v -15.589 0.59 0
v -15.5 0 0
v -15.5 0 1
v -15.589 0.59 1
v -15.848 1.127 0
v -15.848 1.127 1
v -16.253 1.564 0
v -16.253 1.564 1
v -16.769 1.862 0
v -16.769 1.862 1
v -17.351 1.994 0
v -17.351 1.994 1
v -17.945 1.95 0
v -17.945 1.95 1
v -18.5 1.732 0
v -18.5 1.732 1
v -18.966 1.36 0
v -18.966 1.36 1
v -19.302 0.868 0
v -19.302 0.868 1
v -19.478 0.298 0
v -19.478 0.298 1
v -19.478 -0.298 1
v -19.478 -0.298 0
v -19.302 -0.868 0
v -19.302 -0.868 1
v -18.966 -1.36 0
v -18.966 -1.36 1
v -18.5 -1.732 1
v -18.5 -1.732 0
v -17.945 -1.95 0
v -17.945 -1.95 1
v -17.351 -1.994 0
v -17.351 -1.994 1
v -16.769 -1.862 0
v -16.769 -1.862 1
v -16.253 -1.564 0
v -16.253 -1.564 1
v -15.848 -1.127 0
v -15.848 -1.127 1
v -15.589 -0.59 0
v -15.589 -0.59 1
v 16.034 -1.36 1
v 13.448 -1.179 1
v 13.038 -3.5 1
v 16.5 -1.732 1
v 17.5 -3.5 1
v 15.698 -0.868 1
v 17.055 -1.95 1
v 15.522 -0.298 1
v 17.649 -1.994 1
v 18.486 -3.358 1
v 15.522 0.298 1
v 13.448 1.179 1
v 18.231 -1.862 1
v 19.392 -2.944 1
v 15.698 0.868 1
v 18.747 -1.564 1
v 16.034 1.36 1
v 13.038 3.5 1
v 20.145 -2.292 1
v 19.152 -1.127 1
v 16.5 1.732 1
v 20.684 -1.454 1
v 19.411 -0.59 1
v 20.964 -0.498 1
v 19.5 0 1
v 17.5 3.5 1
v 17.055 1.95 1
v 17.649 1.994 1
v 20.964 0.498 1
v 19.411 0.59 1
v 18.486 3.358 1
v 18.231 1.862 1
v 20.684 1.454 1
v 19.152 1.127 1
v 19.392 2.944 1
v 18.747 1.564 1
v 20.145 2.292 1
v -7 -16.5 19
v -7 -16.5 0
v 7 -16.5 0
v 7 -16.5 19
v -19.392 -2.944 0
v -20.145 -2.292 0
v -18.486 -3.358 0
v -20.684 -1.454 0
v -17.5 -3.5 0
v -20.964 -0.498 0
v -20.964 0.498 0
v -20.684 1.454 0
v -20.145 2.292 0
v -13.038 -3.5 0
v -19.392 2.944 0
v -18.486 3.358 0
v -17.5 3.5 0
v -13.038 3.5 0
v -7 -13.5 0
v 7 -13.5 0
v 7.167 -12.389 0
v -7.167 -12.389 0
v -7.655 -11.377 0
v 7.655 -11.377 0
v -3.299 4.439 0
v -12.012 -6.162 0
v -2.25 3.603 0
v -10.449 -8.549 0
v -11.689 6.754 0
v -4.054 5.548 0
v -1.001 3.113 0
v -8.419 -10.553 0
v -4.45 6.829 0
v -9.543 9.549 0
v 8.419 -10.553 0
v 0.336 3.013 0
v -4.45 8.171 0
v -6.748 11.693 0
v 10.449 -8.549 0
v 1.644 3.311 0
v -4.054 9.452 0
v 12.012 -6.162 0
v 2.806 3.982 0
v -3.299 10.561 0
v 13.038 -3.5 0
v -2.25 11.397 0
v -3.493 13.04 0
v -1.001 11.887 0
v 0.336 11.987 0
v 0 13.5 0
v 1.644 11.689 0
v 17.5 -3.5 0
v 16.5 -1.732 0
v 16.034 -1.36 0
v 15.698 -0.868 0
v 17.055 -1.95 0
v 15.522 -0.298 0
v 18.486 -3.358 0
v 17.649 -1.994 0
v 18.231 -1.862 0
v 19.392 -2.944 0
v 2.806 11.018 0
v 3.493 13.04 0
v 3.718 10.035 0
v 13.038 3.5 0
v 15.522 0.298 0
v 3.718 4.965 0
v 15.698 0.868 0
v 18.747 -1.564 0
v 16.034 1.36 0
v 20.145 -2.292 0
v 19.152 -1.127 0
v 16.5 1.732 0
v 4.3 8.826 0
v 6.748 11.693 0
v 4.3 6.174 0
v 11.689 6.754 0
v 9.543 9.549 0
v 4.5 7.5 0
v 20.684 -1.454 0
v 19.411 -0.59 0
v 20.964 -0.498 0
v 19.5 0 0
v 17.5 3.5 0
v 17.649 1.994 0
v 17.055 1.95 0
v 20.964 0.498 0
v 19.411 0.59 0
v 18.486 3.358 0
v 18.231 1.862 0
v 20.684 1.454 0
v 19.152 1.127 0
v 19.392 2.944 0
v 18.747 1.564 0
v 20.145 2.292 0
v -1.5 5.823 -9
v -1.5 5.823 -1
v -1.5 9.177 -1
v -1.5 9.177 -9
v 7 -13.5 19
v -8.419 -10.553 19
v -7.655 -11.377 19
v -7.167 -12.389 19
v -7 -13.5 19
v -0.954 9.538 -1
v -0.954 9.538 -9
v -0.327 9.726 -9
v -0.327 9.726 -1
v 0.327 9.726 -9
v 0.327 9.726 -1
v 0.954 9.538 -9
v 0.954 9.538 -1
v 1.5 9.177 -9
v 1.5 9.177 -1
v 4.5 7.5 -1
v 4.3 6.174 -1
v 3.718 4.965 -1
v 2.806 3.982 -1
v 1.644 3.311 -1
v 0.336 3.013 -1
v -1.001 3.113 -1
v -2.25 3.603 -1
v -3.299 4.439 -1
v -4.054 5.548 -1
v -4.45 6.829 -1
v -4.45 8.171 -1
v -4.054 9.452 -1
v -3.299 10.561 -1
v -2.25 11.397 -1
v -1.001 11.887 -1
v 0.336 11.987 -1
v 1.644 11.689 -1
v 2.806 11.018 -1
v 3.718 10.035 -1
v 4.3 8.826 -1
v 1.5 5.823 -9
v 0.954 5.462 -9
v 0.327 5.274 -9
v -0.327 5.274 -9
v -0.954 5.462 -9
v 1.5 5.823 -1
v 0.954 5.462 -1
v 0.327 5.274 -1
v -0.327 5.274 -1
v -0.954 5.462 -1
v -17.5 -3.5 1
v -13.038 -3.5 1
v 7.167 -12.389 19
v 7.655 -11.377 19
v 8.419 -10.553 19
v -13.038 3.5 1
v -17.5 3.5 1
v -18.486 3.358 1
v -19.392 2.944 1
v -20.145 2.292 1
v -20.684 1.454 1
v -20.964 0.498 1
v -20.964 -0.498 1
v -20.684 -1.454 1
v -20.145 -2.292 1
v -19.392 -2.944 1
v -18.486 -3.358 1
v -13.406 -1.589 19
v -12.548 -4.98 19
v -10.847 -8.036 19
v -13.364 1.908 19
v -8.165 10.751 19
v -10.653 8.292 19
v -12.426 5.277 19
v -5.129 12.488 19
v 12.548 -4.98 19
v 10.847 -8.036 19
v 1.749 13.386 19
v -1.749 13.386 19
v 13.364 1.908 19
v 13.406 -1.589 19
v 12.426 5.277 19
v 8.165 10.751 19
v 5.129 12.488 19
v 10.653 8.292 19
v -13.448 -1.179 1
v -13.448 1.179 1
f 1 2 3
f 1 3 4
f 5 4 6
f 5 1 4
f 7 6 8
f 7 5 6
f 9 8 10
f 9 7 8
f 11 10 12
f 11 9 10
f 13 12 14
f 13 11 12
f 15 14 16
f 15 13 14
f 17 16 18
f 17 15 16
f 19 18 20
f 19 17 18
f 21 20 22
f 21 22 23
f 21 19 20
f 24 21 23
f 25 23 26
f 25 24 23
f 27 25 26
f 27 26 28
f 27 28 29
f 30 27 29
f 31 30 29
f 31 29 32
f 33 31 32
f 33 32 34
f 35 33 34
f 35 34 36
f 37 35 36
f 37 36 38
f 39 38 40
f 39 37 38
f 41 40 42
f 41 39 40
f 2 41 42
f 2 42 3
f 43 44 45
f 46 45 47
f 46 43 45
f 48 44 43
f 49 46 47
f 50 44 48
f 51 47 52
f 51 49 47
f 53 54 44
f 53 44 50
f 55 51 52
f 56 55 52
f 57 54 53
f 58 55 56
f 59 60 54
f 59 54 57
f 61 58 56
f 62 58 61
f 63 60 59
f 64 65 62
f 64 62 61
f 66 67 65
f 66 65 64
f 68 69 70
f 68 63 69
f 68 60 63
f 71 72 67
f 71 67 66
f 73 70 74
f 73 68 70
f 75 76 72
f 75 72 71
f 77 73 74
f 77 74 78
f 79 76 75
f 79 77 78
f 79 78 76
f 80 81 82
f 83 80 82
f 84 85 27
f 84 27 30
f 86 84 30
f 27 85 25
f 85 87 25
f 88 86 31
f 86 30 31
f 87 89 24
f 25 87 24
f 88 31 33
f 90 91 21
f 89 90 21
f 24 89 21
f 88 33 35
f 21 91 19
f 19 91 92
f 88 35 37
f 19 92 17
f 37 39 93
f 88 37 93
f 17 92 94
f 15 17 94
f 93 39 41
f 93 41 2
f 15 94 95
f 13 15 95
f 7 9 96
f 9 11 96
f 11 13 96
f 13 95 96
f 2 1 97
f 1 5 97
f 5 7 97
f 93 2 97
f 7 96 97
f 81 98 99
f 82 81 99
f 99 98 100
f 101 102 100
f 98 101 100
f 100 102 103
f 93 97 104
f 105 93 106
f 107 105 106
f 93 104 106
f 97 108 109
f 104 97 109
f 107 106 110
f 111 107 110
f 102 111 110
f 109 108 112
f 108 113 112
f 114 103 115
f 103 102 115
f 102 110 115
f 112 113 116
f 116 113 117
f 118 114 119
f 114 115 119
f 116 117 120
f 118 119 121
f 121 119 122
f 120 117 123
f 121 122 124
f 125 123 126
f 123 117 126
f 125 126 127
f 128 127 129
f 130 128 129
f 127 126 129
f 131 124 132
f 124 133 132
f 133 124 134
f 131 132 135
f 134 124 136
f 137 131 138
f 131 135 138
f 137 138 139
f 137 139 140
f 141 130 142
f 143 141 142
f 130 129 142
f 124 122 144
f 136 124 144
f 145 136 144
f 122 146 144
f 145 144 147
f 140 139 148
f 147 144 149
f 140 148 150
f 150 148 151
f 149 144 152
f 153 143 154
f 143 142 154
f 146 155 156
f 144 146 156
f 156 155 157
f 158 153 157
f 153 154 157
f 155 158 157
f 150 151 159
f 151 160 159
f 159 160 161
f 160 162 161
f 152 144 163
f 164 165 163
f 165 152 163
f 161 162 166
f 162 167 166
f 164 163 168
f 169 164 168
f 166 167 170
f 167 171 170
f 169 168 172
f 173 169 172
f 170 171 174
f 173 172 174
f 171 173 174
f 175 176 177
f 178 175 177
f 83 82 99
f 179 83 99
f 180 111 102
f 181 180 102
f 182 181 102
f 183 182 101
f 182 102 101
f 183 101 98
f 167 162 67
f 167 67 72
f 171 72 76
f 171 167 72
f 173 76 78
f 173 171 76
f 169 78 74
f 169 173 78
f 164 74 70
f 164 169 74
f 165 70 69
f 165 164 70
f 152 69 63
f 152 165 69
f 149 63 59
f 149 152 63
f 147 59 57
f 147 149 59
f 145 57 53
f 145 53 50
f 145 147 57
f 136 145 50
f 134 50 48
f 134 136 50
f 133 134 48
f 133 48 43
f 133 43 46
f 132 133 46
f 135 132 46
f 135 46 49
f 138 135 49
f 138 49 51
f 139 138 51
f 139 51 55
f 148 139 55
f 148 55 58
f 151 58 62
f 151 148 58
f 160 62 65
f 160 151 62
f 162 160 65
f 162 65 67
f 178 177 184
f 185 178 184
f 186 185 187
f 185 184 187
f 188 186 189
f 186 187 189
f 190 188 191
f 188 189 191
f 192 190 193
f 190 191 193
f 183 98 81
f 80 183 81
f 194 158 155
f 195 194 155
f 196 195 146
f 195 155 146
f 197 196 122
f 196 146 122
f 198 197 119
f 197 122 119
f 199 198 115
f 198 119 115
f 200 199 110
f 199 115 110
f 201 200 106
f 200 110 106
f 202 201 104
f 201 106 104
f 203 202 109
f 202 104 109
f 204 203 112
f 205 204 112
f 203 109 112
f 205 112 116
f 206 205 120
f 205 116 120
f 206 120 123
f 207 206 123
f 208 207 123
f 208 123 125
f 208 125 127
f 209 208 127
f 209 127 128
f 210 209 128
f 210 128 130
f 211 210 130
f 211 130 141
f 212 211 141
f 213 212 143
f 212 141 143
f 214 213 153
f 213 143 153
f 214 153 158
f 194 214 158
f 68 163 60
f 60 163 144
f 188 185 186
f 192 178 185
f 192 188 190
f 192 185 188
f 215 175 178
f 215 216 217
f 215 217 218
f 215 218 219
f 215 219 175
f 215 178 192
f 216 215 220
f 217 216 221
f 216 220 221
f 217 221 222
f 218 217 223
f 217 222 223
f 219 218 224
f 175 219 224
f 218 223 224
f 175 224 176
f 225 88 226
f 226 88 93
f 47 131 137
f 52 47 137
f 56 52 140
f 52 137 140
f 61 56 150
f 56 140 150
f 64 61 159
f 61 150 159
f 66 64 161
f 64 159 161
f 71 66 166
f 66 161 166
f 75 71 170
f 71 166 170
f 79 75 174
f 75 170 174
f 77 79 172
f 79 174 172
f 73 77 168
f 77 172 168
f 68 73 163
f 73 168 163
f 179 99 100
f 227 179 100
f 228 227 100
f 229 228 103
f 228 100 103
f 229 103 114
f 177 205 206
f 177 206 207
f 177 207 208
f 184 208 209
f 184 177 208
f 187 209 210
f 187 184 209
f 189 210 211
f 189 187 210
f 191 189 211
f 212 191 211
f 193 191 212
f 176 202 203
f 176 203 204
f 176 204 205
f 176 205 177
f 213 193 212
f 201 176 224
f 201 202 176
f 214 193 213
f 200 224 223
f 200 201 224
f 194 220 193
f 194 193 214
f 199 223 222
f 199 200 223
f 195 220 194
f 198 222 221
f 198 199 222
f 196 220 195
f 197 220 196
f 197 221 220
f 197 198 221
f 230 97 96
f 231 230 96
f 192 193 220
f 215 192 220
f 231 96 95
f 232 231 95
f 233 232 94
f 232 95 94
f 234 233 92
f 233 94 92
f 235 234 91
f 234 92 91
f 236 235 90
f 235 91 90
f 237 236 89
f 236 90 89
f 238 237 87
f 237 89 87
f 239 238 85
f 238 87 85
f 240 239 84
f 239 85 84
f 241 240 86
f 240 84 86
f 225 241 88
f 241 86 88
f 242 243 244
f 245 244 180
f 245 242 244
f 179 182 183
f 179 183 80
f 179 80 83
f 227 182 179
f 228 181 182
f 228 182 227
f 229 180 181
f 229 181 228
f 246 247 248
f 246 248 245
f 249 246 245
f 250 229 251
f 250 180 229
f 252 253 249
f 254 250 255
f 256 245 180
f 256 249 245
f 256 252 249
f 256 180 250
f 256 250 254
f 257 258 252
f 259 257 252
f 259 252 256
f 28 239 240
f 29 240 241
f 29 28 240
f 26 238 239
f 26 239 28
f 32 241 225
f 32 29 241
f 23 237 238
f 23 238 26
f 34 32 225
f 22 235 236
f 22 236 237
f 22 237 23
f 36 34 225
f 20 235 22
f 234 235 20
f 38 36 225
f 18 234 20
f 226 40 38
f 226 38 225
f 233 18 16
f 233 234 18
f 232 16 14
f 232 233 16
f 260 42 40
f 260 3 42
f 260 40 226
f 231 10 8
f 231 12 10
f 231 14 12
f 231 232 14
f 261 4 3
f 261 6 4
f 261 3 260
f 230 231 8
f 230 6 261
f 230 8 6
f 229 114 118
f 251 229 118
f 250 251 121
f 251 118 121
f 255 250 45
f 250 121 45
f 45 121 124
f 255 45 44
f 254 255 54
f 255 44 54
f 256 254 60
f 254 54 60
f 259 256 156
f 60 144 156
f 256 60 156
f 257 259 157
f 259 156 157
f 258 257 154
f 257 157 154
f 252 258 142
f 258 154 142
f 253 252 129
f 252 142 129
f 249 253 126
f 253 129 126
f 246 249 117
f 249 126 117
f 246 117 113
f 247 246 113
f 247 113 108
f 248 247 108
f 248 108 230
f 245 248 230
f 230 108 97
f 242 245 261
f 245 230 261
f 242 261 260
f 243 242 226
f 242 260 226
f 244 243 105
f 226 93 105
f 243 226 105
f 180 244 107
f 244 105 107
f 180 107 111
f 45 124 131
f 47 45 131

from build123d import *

# Parameters (mm, degrees)
F1_DEPTH = 19
F2_R     = 2
F3_DEPTH = 1
F4_R     = 4.5
F5_DEPTH = 1
F7_DEPTH = 8


with BuildPart() as f1:
    # F0 (on Top) → F1 (new body)
    with BuildSketch(Plane.XY):
        with BuildLine():
            ThreePointArc((7, -13.5), (7.3731475524, -11.8648488215), (8.4187082405, -10.5534521158))
            ThreePointArc((8.4187082405, -10.5534521158), (0, 13.5), (-8.4187082405, -10.5534521158))
            ThreePointArc((-8.4187082405, -10.5534521158), (-7.3731475524, -11.8648488215), (-7, -13.5))
            Line((-7, -13.5), (-7, -16.5))
            Line((-7, -16.5), (7, -16.5))
            Line((7, -16.5), (7, -13.5))
        make_face()
    extrude(amount=F1_DEPTH)

    # F2 (on Top) → F3 (join)
    with BuildSketch(Plane.XY):
        with BuildLine():
            ThreePointArc((13.0384048104, 3.5), (13.5, 0), (13.0384048104, -3.5))
            Line((13.0384048104, -3.5), (17.5, -3.5))
            ThreePointArc((17.5, -3.5), (21, 0), (17.5, 3.5))
            Line((17.5, 3.5), (13.0384048104, 3.5))
        make_face()
        with Locations((17.5, 0)):
            Circle(F2_R, mode=Mode.SUBTRACT)
        with BuildLine():
            Line((-17.5, -3.5), (-13.0384048104, -3.5))
            ThreePointArc((-13.0384048104, -3.5), (-13.5, 0), (-13.0384048104, 3.5))
            Line((-13.0384048104, 3.5), (-17.5, 3.5))
            ThreePointArc((-17.5, 3.5), (-21, 0), (-17.5, -3.5))
        make_face()
        with Locations((-17.5, 0)):
            Circle(F2_R, mode=Mode.SUBTRACT)
    extrude(amount=F3_DEPTH)

    # F4 (on face) → F5 (join)
    with BuildSketch(Plane(origin=(0, 0, 0), x_dir=(1, 0, 0), z_dir=(0, 0, -1))):
        with Locations((0, -7.5)):
            Circle(F4_R)
    extrude(amount=F5_DEPTH)

    # F6 (on face) → F7 (join)
    with BuildSketch(Plane(origin=(0, 0, -1), x_dir=(1, 0, 0), z_dir=(0, 0, -1))):
        with BuildLine():
            Line((-1.5, -5.8229490169), (-1.5, -9.1770509831))
            ThreePointArc((-1.5, -9.1770509831), (0, -9.75), (1.5, -9.1770509831))
            Line((1.5, -9.1770509831), (1.5, -5.8229490169))
            ThreePointArc((1.5, -5.8229490169), (0, -5.25), (-1.5, -5.8229490169))
        make_face()
    extrude(amount=F7_DEPTH)


solid = f1.part
